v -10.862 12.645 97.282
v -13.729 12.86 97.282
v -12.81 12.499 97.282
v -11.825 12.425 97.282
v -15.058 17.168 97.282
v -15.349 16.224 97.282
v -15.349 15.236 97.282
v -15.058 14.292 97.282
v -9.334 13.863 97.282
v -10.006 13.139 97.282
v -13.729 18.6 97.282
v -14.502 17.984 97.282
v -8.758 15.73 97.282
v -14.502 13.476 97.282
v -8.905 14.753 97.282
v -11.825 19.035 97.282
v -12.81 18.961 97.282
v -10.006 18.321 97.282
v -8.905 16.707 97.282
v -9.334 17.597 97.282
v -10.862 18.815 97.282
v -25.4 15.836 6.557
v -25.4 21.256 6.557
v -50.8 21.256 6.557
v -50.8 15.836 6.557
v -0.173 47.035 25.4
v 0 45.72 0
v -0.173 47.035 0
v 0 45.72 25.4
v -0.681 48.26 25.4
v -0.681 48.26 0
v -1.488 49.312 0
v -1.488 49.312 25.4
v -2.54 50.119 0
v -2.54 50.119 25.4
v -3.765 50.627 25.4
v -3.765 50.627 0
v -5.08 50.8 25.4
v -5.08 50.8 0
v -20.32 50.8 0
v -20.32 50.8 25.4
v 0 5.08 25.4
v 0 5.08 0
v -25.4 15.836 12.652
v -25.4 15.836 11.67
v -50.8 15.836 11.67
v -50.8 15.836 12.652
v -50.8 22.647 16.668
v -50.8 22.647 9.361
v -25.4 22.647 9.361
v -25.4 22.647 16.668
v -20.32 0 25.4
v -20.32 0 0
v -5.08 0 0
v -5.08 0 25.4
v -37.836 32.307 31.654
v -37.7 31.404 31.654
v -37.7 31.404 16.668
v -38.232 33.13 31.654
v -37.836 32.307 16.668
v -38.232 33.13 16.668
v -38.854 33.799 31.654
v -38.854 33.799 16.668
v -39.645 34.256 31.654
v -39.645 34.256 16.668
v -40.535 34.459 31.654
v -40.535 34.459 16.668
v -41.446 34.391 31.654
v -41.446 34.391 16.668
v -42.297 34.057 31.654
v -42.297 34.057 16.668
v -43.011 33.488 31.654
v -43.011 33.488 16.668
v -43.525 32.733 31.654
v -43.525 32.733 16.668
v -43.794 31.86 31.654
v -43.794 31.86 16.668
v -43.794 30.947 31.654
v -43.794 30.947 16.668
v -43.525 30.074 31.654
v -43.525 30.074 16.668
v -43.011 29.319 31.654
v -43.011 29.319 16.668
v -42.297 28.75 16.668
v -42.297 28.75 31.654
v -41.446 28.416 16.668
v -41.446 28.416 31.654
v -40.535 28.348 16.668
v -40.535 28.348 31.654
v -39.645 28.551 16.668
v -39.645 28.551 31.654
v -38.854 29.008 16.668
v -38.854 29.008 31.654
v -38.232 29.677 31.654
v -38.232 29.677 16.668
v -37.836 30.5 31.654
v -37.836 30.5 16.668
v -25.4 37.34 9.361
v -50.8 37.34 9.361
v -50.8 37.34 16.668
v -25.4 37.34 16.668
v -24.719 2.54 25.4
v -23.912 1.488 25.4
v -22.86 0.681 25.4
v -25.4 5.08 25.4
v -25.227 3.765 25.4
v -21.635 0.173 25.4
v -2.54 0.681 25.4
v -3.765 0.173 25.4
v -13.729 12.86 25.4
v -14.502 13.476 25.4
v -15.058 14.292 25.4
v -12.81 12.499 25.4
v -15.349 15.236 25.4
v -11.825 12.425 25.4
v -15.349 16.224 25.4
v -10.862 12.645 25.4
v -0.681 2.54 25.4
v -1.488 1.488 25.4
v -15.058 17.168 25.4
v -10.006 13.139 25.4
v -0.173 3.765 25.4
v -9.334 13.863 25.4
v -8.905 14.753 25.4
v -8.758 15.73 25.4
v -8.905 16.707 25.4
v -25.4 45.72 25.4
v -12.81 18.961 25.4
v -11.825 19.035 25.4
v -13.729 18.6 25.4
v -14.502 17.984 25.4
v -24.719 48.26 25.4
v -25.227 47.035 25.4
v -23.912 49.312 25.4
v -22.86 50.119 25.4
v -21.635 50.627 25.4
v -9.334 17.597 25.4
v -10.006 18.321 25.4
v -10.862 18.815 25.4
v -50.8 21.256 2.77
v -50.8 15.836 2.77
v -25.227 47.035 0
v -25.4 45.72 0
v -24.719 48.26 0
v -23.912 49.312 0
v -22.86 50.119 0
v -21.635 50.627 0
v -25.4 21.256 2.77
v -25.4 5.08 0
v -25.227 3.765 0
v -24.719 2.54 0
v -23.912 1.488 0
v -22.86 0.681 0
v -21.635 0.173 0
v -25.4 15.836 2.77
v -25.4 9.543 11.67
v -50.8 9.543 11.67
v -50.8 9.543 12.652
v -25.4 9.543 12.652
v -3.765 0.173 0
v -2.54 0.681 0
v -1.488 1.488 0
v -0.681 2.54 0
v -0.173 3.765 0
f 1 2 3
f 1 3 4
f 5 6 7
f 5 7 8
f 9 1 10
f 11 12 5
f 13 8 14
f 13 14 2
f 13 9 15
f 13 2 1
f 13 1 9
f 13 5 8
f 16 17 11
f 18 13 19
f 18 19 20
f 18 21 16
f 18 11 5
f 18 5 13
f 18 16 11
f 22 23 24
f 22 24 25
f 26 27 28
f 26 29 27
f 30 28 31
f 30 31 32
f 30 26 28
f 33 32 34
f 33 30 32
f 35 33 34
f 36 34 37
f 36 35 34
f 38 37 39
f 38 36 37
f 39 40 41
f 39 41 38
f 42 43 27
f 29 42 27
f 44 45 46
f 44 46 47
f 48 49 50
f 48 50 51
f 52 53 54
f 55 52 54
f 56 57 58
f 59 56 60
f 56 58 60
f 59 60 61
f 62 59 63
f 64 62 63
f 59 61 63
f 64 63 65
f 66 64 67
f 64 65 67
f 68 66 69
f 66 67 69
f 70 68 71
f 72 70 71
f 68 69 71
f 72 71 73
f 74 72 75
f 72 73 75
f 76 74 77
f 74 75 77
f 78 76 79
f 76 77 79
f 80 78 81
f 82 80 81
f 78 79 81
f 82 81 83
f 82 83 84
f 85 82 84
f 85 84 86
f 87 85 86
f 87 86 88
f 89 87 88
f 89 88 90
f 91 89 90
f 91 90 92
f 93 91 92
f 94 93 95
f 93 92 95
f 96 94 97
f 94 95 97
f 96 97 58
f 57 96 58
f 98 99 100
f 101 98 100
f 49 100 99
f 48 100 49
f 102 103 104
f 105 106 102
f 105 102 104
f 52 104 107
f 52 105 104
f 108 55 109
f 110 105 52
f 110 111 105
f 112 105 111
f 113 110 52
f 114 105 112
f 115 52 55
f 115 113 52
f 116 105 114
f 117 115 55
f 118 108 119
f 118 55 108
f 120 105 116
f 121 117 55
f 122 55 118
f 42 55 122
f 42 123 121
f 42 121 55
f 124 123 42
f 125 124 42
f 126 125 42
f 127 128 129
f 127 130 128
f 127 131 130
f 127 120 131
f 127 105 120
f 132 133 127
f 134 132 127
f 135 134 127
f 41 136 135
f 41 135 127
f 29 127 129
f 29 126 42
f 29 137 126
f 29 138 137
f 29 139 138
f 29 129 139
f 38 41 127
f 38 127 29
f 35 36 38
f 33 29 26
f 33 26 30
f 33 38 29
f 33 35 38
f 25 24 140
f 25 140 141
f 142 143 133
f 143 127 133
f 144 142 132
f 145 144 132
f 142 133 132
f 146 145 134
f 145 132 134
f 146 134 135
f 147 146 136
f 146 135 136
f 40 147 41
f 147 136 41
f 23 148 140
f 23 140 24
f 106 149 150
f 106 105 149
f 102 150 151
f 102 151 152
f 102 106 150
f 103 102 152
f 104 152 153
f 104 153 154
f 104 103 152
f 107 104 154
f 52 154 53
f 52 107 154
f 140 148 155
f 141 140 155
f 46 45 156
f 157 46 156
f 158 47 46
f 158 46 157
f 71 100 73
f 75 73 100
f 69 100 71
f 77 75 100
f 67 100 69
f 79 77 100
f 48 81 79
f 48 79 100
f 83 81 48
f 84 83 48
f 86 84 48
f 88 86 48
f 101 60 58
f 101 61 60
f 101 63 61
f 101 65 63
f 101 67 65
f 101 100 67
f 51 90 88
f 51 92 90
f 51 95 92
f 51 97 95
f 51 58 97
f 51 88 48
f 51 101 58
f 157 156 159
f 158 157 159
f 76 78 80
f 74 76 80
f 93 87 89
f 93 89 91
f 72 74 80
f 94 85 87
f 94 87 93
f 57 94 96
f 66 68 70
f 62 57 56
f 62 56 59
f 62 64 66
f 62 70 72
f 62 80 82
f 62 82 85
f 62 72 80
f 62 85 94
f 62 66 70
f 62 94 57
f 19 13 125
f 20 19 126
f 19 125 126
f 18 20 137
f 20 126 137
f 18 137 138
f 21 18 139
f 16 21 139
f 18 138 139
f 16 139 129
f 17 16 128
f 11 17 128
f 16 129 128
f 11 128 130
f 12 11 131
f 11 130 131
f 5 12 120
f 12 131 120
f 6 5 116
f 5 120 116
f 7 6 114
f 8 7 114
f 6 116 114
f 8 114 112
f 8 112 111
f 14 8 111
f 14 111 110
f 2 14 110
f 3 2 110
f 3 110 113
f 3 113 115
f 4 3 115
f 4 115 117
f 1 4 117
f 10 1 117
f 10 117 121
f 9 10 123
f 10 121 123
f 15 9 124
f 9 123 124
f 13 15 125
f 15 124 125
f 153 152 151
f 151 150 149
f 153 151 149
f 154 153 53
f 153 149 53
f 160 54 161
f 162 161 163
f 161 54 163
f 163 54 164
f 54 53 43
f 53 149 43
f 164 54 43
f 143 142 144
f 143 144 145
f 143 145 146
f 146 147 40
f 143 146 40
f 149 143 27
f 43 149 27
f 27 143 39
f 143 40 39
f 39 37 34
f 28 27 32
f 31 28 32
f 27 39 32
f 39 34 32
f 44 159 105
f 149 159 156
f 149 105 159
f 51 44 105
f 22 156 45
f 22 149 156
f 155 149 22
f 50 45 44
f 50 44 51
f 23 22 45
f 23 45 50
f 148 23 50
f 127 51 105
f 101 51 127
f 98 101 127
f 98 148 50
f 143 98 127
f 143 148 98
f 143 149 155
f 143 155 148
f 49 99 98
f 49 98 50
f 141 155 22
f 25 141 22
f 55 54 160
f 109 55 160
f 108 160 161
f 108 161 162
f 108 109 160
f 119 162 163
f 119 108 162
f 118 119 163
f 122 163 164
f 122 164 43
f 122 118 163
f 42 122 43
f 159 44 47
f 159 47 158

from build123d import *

# Parameters (mm, degrees)
F0_W     = 25.4
F0_H     = 50.8
F1_DEPTH = 25.4
F2_R     = 5.08
F3_R     = 3.31416
F4_DEPTH = 71.882
F5_W     = 6.293828
F5_H     = 0.982571
F5_W_2   = 5.419478
F5_H_2   = 3.787311
F5_W_3   = 14.692617
F5_H_3   = 7.307336
F6_DEPTH = 25.4
F7_R     = 3.064351
F8_DEPTH = 14.986


with BuildPart() as f1:
    # F0 (on Top) → F1 (new body)
    with BuildSketch(Plane.XY):
        with Locations((-12.7, 25.4)):
            Rectangle(F0_W, F0_H)
    extrude(amount=F1_DEPTH)

    # F2
    f2_edges = [f1.edges().sort_by_distance(p)[0] for p in [
        (0, 0, 12.7),
        (-25.4, 0, 12.7),
        (0, 50.8, 12.7),
        (-25.4, 50.8, 12.7),
    ]]
    fillet(f2_edges, radius=F2_R)

    # F3 (on face) → F4 (join)
    with BuildSketch(Plane.XY.offset(25.4)):
        with Locations((-12.072328, 15.729843)):
            Circle(F3_R)
    extrude(amount=F4_DEPTH)

    # F5 (on face) → F6 (join)
    with BuildSketch(Plane(origin=(-25.4, 0, 0), x_dir=(0, -1, 0), z_dir=(-1, 0, 0))):
        with Locations((-12.68953, 12.160792)):
            Rectangle(F5_W, F5_H)
        with Locations((-18.546183, 4.663679)):
            Rectangle(F5_W_2, F5_H_2)
        with Locations((-29.99346, 13.014776)):
            Rectangle(F5_W_3, F5_H_3)
    extrude(amount=F6_DEPTH)

    # F7 (on face) → F8 (join)
    with BuildSketch(Plane.XY.offset(16.668444)):
        with Locations((-40.764336, 31.40362)):
            Circle(F7_R)
    extrude(amount=F8_DEPTH)


solid = f1.part
